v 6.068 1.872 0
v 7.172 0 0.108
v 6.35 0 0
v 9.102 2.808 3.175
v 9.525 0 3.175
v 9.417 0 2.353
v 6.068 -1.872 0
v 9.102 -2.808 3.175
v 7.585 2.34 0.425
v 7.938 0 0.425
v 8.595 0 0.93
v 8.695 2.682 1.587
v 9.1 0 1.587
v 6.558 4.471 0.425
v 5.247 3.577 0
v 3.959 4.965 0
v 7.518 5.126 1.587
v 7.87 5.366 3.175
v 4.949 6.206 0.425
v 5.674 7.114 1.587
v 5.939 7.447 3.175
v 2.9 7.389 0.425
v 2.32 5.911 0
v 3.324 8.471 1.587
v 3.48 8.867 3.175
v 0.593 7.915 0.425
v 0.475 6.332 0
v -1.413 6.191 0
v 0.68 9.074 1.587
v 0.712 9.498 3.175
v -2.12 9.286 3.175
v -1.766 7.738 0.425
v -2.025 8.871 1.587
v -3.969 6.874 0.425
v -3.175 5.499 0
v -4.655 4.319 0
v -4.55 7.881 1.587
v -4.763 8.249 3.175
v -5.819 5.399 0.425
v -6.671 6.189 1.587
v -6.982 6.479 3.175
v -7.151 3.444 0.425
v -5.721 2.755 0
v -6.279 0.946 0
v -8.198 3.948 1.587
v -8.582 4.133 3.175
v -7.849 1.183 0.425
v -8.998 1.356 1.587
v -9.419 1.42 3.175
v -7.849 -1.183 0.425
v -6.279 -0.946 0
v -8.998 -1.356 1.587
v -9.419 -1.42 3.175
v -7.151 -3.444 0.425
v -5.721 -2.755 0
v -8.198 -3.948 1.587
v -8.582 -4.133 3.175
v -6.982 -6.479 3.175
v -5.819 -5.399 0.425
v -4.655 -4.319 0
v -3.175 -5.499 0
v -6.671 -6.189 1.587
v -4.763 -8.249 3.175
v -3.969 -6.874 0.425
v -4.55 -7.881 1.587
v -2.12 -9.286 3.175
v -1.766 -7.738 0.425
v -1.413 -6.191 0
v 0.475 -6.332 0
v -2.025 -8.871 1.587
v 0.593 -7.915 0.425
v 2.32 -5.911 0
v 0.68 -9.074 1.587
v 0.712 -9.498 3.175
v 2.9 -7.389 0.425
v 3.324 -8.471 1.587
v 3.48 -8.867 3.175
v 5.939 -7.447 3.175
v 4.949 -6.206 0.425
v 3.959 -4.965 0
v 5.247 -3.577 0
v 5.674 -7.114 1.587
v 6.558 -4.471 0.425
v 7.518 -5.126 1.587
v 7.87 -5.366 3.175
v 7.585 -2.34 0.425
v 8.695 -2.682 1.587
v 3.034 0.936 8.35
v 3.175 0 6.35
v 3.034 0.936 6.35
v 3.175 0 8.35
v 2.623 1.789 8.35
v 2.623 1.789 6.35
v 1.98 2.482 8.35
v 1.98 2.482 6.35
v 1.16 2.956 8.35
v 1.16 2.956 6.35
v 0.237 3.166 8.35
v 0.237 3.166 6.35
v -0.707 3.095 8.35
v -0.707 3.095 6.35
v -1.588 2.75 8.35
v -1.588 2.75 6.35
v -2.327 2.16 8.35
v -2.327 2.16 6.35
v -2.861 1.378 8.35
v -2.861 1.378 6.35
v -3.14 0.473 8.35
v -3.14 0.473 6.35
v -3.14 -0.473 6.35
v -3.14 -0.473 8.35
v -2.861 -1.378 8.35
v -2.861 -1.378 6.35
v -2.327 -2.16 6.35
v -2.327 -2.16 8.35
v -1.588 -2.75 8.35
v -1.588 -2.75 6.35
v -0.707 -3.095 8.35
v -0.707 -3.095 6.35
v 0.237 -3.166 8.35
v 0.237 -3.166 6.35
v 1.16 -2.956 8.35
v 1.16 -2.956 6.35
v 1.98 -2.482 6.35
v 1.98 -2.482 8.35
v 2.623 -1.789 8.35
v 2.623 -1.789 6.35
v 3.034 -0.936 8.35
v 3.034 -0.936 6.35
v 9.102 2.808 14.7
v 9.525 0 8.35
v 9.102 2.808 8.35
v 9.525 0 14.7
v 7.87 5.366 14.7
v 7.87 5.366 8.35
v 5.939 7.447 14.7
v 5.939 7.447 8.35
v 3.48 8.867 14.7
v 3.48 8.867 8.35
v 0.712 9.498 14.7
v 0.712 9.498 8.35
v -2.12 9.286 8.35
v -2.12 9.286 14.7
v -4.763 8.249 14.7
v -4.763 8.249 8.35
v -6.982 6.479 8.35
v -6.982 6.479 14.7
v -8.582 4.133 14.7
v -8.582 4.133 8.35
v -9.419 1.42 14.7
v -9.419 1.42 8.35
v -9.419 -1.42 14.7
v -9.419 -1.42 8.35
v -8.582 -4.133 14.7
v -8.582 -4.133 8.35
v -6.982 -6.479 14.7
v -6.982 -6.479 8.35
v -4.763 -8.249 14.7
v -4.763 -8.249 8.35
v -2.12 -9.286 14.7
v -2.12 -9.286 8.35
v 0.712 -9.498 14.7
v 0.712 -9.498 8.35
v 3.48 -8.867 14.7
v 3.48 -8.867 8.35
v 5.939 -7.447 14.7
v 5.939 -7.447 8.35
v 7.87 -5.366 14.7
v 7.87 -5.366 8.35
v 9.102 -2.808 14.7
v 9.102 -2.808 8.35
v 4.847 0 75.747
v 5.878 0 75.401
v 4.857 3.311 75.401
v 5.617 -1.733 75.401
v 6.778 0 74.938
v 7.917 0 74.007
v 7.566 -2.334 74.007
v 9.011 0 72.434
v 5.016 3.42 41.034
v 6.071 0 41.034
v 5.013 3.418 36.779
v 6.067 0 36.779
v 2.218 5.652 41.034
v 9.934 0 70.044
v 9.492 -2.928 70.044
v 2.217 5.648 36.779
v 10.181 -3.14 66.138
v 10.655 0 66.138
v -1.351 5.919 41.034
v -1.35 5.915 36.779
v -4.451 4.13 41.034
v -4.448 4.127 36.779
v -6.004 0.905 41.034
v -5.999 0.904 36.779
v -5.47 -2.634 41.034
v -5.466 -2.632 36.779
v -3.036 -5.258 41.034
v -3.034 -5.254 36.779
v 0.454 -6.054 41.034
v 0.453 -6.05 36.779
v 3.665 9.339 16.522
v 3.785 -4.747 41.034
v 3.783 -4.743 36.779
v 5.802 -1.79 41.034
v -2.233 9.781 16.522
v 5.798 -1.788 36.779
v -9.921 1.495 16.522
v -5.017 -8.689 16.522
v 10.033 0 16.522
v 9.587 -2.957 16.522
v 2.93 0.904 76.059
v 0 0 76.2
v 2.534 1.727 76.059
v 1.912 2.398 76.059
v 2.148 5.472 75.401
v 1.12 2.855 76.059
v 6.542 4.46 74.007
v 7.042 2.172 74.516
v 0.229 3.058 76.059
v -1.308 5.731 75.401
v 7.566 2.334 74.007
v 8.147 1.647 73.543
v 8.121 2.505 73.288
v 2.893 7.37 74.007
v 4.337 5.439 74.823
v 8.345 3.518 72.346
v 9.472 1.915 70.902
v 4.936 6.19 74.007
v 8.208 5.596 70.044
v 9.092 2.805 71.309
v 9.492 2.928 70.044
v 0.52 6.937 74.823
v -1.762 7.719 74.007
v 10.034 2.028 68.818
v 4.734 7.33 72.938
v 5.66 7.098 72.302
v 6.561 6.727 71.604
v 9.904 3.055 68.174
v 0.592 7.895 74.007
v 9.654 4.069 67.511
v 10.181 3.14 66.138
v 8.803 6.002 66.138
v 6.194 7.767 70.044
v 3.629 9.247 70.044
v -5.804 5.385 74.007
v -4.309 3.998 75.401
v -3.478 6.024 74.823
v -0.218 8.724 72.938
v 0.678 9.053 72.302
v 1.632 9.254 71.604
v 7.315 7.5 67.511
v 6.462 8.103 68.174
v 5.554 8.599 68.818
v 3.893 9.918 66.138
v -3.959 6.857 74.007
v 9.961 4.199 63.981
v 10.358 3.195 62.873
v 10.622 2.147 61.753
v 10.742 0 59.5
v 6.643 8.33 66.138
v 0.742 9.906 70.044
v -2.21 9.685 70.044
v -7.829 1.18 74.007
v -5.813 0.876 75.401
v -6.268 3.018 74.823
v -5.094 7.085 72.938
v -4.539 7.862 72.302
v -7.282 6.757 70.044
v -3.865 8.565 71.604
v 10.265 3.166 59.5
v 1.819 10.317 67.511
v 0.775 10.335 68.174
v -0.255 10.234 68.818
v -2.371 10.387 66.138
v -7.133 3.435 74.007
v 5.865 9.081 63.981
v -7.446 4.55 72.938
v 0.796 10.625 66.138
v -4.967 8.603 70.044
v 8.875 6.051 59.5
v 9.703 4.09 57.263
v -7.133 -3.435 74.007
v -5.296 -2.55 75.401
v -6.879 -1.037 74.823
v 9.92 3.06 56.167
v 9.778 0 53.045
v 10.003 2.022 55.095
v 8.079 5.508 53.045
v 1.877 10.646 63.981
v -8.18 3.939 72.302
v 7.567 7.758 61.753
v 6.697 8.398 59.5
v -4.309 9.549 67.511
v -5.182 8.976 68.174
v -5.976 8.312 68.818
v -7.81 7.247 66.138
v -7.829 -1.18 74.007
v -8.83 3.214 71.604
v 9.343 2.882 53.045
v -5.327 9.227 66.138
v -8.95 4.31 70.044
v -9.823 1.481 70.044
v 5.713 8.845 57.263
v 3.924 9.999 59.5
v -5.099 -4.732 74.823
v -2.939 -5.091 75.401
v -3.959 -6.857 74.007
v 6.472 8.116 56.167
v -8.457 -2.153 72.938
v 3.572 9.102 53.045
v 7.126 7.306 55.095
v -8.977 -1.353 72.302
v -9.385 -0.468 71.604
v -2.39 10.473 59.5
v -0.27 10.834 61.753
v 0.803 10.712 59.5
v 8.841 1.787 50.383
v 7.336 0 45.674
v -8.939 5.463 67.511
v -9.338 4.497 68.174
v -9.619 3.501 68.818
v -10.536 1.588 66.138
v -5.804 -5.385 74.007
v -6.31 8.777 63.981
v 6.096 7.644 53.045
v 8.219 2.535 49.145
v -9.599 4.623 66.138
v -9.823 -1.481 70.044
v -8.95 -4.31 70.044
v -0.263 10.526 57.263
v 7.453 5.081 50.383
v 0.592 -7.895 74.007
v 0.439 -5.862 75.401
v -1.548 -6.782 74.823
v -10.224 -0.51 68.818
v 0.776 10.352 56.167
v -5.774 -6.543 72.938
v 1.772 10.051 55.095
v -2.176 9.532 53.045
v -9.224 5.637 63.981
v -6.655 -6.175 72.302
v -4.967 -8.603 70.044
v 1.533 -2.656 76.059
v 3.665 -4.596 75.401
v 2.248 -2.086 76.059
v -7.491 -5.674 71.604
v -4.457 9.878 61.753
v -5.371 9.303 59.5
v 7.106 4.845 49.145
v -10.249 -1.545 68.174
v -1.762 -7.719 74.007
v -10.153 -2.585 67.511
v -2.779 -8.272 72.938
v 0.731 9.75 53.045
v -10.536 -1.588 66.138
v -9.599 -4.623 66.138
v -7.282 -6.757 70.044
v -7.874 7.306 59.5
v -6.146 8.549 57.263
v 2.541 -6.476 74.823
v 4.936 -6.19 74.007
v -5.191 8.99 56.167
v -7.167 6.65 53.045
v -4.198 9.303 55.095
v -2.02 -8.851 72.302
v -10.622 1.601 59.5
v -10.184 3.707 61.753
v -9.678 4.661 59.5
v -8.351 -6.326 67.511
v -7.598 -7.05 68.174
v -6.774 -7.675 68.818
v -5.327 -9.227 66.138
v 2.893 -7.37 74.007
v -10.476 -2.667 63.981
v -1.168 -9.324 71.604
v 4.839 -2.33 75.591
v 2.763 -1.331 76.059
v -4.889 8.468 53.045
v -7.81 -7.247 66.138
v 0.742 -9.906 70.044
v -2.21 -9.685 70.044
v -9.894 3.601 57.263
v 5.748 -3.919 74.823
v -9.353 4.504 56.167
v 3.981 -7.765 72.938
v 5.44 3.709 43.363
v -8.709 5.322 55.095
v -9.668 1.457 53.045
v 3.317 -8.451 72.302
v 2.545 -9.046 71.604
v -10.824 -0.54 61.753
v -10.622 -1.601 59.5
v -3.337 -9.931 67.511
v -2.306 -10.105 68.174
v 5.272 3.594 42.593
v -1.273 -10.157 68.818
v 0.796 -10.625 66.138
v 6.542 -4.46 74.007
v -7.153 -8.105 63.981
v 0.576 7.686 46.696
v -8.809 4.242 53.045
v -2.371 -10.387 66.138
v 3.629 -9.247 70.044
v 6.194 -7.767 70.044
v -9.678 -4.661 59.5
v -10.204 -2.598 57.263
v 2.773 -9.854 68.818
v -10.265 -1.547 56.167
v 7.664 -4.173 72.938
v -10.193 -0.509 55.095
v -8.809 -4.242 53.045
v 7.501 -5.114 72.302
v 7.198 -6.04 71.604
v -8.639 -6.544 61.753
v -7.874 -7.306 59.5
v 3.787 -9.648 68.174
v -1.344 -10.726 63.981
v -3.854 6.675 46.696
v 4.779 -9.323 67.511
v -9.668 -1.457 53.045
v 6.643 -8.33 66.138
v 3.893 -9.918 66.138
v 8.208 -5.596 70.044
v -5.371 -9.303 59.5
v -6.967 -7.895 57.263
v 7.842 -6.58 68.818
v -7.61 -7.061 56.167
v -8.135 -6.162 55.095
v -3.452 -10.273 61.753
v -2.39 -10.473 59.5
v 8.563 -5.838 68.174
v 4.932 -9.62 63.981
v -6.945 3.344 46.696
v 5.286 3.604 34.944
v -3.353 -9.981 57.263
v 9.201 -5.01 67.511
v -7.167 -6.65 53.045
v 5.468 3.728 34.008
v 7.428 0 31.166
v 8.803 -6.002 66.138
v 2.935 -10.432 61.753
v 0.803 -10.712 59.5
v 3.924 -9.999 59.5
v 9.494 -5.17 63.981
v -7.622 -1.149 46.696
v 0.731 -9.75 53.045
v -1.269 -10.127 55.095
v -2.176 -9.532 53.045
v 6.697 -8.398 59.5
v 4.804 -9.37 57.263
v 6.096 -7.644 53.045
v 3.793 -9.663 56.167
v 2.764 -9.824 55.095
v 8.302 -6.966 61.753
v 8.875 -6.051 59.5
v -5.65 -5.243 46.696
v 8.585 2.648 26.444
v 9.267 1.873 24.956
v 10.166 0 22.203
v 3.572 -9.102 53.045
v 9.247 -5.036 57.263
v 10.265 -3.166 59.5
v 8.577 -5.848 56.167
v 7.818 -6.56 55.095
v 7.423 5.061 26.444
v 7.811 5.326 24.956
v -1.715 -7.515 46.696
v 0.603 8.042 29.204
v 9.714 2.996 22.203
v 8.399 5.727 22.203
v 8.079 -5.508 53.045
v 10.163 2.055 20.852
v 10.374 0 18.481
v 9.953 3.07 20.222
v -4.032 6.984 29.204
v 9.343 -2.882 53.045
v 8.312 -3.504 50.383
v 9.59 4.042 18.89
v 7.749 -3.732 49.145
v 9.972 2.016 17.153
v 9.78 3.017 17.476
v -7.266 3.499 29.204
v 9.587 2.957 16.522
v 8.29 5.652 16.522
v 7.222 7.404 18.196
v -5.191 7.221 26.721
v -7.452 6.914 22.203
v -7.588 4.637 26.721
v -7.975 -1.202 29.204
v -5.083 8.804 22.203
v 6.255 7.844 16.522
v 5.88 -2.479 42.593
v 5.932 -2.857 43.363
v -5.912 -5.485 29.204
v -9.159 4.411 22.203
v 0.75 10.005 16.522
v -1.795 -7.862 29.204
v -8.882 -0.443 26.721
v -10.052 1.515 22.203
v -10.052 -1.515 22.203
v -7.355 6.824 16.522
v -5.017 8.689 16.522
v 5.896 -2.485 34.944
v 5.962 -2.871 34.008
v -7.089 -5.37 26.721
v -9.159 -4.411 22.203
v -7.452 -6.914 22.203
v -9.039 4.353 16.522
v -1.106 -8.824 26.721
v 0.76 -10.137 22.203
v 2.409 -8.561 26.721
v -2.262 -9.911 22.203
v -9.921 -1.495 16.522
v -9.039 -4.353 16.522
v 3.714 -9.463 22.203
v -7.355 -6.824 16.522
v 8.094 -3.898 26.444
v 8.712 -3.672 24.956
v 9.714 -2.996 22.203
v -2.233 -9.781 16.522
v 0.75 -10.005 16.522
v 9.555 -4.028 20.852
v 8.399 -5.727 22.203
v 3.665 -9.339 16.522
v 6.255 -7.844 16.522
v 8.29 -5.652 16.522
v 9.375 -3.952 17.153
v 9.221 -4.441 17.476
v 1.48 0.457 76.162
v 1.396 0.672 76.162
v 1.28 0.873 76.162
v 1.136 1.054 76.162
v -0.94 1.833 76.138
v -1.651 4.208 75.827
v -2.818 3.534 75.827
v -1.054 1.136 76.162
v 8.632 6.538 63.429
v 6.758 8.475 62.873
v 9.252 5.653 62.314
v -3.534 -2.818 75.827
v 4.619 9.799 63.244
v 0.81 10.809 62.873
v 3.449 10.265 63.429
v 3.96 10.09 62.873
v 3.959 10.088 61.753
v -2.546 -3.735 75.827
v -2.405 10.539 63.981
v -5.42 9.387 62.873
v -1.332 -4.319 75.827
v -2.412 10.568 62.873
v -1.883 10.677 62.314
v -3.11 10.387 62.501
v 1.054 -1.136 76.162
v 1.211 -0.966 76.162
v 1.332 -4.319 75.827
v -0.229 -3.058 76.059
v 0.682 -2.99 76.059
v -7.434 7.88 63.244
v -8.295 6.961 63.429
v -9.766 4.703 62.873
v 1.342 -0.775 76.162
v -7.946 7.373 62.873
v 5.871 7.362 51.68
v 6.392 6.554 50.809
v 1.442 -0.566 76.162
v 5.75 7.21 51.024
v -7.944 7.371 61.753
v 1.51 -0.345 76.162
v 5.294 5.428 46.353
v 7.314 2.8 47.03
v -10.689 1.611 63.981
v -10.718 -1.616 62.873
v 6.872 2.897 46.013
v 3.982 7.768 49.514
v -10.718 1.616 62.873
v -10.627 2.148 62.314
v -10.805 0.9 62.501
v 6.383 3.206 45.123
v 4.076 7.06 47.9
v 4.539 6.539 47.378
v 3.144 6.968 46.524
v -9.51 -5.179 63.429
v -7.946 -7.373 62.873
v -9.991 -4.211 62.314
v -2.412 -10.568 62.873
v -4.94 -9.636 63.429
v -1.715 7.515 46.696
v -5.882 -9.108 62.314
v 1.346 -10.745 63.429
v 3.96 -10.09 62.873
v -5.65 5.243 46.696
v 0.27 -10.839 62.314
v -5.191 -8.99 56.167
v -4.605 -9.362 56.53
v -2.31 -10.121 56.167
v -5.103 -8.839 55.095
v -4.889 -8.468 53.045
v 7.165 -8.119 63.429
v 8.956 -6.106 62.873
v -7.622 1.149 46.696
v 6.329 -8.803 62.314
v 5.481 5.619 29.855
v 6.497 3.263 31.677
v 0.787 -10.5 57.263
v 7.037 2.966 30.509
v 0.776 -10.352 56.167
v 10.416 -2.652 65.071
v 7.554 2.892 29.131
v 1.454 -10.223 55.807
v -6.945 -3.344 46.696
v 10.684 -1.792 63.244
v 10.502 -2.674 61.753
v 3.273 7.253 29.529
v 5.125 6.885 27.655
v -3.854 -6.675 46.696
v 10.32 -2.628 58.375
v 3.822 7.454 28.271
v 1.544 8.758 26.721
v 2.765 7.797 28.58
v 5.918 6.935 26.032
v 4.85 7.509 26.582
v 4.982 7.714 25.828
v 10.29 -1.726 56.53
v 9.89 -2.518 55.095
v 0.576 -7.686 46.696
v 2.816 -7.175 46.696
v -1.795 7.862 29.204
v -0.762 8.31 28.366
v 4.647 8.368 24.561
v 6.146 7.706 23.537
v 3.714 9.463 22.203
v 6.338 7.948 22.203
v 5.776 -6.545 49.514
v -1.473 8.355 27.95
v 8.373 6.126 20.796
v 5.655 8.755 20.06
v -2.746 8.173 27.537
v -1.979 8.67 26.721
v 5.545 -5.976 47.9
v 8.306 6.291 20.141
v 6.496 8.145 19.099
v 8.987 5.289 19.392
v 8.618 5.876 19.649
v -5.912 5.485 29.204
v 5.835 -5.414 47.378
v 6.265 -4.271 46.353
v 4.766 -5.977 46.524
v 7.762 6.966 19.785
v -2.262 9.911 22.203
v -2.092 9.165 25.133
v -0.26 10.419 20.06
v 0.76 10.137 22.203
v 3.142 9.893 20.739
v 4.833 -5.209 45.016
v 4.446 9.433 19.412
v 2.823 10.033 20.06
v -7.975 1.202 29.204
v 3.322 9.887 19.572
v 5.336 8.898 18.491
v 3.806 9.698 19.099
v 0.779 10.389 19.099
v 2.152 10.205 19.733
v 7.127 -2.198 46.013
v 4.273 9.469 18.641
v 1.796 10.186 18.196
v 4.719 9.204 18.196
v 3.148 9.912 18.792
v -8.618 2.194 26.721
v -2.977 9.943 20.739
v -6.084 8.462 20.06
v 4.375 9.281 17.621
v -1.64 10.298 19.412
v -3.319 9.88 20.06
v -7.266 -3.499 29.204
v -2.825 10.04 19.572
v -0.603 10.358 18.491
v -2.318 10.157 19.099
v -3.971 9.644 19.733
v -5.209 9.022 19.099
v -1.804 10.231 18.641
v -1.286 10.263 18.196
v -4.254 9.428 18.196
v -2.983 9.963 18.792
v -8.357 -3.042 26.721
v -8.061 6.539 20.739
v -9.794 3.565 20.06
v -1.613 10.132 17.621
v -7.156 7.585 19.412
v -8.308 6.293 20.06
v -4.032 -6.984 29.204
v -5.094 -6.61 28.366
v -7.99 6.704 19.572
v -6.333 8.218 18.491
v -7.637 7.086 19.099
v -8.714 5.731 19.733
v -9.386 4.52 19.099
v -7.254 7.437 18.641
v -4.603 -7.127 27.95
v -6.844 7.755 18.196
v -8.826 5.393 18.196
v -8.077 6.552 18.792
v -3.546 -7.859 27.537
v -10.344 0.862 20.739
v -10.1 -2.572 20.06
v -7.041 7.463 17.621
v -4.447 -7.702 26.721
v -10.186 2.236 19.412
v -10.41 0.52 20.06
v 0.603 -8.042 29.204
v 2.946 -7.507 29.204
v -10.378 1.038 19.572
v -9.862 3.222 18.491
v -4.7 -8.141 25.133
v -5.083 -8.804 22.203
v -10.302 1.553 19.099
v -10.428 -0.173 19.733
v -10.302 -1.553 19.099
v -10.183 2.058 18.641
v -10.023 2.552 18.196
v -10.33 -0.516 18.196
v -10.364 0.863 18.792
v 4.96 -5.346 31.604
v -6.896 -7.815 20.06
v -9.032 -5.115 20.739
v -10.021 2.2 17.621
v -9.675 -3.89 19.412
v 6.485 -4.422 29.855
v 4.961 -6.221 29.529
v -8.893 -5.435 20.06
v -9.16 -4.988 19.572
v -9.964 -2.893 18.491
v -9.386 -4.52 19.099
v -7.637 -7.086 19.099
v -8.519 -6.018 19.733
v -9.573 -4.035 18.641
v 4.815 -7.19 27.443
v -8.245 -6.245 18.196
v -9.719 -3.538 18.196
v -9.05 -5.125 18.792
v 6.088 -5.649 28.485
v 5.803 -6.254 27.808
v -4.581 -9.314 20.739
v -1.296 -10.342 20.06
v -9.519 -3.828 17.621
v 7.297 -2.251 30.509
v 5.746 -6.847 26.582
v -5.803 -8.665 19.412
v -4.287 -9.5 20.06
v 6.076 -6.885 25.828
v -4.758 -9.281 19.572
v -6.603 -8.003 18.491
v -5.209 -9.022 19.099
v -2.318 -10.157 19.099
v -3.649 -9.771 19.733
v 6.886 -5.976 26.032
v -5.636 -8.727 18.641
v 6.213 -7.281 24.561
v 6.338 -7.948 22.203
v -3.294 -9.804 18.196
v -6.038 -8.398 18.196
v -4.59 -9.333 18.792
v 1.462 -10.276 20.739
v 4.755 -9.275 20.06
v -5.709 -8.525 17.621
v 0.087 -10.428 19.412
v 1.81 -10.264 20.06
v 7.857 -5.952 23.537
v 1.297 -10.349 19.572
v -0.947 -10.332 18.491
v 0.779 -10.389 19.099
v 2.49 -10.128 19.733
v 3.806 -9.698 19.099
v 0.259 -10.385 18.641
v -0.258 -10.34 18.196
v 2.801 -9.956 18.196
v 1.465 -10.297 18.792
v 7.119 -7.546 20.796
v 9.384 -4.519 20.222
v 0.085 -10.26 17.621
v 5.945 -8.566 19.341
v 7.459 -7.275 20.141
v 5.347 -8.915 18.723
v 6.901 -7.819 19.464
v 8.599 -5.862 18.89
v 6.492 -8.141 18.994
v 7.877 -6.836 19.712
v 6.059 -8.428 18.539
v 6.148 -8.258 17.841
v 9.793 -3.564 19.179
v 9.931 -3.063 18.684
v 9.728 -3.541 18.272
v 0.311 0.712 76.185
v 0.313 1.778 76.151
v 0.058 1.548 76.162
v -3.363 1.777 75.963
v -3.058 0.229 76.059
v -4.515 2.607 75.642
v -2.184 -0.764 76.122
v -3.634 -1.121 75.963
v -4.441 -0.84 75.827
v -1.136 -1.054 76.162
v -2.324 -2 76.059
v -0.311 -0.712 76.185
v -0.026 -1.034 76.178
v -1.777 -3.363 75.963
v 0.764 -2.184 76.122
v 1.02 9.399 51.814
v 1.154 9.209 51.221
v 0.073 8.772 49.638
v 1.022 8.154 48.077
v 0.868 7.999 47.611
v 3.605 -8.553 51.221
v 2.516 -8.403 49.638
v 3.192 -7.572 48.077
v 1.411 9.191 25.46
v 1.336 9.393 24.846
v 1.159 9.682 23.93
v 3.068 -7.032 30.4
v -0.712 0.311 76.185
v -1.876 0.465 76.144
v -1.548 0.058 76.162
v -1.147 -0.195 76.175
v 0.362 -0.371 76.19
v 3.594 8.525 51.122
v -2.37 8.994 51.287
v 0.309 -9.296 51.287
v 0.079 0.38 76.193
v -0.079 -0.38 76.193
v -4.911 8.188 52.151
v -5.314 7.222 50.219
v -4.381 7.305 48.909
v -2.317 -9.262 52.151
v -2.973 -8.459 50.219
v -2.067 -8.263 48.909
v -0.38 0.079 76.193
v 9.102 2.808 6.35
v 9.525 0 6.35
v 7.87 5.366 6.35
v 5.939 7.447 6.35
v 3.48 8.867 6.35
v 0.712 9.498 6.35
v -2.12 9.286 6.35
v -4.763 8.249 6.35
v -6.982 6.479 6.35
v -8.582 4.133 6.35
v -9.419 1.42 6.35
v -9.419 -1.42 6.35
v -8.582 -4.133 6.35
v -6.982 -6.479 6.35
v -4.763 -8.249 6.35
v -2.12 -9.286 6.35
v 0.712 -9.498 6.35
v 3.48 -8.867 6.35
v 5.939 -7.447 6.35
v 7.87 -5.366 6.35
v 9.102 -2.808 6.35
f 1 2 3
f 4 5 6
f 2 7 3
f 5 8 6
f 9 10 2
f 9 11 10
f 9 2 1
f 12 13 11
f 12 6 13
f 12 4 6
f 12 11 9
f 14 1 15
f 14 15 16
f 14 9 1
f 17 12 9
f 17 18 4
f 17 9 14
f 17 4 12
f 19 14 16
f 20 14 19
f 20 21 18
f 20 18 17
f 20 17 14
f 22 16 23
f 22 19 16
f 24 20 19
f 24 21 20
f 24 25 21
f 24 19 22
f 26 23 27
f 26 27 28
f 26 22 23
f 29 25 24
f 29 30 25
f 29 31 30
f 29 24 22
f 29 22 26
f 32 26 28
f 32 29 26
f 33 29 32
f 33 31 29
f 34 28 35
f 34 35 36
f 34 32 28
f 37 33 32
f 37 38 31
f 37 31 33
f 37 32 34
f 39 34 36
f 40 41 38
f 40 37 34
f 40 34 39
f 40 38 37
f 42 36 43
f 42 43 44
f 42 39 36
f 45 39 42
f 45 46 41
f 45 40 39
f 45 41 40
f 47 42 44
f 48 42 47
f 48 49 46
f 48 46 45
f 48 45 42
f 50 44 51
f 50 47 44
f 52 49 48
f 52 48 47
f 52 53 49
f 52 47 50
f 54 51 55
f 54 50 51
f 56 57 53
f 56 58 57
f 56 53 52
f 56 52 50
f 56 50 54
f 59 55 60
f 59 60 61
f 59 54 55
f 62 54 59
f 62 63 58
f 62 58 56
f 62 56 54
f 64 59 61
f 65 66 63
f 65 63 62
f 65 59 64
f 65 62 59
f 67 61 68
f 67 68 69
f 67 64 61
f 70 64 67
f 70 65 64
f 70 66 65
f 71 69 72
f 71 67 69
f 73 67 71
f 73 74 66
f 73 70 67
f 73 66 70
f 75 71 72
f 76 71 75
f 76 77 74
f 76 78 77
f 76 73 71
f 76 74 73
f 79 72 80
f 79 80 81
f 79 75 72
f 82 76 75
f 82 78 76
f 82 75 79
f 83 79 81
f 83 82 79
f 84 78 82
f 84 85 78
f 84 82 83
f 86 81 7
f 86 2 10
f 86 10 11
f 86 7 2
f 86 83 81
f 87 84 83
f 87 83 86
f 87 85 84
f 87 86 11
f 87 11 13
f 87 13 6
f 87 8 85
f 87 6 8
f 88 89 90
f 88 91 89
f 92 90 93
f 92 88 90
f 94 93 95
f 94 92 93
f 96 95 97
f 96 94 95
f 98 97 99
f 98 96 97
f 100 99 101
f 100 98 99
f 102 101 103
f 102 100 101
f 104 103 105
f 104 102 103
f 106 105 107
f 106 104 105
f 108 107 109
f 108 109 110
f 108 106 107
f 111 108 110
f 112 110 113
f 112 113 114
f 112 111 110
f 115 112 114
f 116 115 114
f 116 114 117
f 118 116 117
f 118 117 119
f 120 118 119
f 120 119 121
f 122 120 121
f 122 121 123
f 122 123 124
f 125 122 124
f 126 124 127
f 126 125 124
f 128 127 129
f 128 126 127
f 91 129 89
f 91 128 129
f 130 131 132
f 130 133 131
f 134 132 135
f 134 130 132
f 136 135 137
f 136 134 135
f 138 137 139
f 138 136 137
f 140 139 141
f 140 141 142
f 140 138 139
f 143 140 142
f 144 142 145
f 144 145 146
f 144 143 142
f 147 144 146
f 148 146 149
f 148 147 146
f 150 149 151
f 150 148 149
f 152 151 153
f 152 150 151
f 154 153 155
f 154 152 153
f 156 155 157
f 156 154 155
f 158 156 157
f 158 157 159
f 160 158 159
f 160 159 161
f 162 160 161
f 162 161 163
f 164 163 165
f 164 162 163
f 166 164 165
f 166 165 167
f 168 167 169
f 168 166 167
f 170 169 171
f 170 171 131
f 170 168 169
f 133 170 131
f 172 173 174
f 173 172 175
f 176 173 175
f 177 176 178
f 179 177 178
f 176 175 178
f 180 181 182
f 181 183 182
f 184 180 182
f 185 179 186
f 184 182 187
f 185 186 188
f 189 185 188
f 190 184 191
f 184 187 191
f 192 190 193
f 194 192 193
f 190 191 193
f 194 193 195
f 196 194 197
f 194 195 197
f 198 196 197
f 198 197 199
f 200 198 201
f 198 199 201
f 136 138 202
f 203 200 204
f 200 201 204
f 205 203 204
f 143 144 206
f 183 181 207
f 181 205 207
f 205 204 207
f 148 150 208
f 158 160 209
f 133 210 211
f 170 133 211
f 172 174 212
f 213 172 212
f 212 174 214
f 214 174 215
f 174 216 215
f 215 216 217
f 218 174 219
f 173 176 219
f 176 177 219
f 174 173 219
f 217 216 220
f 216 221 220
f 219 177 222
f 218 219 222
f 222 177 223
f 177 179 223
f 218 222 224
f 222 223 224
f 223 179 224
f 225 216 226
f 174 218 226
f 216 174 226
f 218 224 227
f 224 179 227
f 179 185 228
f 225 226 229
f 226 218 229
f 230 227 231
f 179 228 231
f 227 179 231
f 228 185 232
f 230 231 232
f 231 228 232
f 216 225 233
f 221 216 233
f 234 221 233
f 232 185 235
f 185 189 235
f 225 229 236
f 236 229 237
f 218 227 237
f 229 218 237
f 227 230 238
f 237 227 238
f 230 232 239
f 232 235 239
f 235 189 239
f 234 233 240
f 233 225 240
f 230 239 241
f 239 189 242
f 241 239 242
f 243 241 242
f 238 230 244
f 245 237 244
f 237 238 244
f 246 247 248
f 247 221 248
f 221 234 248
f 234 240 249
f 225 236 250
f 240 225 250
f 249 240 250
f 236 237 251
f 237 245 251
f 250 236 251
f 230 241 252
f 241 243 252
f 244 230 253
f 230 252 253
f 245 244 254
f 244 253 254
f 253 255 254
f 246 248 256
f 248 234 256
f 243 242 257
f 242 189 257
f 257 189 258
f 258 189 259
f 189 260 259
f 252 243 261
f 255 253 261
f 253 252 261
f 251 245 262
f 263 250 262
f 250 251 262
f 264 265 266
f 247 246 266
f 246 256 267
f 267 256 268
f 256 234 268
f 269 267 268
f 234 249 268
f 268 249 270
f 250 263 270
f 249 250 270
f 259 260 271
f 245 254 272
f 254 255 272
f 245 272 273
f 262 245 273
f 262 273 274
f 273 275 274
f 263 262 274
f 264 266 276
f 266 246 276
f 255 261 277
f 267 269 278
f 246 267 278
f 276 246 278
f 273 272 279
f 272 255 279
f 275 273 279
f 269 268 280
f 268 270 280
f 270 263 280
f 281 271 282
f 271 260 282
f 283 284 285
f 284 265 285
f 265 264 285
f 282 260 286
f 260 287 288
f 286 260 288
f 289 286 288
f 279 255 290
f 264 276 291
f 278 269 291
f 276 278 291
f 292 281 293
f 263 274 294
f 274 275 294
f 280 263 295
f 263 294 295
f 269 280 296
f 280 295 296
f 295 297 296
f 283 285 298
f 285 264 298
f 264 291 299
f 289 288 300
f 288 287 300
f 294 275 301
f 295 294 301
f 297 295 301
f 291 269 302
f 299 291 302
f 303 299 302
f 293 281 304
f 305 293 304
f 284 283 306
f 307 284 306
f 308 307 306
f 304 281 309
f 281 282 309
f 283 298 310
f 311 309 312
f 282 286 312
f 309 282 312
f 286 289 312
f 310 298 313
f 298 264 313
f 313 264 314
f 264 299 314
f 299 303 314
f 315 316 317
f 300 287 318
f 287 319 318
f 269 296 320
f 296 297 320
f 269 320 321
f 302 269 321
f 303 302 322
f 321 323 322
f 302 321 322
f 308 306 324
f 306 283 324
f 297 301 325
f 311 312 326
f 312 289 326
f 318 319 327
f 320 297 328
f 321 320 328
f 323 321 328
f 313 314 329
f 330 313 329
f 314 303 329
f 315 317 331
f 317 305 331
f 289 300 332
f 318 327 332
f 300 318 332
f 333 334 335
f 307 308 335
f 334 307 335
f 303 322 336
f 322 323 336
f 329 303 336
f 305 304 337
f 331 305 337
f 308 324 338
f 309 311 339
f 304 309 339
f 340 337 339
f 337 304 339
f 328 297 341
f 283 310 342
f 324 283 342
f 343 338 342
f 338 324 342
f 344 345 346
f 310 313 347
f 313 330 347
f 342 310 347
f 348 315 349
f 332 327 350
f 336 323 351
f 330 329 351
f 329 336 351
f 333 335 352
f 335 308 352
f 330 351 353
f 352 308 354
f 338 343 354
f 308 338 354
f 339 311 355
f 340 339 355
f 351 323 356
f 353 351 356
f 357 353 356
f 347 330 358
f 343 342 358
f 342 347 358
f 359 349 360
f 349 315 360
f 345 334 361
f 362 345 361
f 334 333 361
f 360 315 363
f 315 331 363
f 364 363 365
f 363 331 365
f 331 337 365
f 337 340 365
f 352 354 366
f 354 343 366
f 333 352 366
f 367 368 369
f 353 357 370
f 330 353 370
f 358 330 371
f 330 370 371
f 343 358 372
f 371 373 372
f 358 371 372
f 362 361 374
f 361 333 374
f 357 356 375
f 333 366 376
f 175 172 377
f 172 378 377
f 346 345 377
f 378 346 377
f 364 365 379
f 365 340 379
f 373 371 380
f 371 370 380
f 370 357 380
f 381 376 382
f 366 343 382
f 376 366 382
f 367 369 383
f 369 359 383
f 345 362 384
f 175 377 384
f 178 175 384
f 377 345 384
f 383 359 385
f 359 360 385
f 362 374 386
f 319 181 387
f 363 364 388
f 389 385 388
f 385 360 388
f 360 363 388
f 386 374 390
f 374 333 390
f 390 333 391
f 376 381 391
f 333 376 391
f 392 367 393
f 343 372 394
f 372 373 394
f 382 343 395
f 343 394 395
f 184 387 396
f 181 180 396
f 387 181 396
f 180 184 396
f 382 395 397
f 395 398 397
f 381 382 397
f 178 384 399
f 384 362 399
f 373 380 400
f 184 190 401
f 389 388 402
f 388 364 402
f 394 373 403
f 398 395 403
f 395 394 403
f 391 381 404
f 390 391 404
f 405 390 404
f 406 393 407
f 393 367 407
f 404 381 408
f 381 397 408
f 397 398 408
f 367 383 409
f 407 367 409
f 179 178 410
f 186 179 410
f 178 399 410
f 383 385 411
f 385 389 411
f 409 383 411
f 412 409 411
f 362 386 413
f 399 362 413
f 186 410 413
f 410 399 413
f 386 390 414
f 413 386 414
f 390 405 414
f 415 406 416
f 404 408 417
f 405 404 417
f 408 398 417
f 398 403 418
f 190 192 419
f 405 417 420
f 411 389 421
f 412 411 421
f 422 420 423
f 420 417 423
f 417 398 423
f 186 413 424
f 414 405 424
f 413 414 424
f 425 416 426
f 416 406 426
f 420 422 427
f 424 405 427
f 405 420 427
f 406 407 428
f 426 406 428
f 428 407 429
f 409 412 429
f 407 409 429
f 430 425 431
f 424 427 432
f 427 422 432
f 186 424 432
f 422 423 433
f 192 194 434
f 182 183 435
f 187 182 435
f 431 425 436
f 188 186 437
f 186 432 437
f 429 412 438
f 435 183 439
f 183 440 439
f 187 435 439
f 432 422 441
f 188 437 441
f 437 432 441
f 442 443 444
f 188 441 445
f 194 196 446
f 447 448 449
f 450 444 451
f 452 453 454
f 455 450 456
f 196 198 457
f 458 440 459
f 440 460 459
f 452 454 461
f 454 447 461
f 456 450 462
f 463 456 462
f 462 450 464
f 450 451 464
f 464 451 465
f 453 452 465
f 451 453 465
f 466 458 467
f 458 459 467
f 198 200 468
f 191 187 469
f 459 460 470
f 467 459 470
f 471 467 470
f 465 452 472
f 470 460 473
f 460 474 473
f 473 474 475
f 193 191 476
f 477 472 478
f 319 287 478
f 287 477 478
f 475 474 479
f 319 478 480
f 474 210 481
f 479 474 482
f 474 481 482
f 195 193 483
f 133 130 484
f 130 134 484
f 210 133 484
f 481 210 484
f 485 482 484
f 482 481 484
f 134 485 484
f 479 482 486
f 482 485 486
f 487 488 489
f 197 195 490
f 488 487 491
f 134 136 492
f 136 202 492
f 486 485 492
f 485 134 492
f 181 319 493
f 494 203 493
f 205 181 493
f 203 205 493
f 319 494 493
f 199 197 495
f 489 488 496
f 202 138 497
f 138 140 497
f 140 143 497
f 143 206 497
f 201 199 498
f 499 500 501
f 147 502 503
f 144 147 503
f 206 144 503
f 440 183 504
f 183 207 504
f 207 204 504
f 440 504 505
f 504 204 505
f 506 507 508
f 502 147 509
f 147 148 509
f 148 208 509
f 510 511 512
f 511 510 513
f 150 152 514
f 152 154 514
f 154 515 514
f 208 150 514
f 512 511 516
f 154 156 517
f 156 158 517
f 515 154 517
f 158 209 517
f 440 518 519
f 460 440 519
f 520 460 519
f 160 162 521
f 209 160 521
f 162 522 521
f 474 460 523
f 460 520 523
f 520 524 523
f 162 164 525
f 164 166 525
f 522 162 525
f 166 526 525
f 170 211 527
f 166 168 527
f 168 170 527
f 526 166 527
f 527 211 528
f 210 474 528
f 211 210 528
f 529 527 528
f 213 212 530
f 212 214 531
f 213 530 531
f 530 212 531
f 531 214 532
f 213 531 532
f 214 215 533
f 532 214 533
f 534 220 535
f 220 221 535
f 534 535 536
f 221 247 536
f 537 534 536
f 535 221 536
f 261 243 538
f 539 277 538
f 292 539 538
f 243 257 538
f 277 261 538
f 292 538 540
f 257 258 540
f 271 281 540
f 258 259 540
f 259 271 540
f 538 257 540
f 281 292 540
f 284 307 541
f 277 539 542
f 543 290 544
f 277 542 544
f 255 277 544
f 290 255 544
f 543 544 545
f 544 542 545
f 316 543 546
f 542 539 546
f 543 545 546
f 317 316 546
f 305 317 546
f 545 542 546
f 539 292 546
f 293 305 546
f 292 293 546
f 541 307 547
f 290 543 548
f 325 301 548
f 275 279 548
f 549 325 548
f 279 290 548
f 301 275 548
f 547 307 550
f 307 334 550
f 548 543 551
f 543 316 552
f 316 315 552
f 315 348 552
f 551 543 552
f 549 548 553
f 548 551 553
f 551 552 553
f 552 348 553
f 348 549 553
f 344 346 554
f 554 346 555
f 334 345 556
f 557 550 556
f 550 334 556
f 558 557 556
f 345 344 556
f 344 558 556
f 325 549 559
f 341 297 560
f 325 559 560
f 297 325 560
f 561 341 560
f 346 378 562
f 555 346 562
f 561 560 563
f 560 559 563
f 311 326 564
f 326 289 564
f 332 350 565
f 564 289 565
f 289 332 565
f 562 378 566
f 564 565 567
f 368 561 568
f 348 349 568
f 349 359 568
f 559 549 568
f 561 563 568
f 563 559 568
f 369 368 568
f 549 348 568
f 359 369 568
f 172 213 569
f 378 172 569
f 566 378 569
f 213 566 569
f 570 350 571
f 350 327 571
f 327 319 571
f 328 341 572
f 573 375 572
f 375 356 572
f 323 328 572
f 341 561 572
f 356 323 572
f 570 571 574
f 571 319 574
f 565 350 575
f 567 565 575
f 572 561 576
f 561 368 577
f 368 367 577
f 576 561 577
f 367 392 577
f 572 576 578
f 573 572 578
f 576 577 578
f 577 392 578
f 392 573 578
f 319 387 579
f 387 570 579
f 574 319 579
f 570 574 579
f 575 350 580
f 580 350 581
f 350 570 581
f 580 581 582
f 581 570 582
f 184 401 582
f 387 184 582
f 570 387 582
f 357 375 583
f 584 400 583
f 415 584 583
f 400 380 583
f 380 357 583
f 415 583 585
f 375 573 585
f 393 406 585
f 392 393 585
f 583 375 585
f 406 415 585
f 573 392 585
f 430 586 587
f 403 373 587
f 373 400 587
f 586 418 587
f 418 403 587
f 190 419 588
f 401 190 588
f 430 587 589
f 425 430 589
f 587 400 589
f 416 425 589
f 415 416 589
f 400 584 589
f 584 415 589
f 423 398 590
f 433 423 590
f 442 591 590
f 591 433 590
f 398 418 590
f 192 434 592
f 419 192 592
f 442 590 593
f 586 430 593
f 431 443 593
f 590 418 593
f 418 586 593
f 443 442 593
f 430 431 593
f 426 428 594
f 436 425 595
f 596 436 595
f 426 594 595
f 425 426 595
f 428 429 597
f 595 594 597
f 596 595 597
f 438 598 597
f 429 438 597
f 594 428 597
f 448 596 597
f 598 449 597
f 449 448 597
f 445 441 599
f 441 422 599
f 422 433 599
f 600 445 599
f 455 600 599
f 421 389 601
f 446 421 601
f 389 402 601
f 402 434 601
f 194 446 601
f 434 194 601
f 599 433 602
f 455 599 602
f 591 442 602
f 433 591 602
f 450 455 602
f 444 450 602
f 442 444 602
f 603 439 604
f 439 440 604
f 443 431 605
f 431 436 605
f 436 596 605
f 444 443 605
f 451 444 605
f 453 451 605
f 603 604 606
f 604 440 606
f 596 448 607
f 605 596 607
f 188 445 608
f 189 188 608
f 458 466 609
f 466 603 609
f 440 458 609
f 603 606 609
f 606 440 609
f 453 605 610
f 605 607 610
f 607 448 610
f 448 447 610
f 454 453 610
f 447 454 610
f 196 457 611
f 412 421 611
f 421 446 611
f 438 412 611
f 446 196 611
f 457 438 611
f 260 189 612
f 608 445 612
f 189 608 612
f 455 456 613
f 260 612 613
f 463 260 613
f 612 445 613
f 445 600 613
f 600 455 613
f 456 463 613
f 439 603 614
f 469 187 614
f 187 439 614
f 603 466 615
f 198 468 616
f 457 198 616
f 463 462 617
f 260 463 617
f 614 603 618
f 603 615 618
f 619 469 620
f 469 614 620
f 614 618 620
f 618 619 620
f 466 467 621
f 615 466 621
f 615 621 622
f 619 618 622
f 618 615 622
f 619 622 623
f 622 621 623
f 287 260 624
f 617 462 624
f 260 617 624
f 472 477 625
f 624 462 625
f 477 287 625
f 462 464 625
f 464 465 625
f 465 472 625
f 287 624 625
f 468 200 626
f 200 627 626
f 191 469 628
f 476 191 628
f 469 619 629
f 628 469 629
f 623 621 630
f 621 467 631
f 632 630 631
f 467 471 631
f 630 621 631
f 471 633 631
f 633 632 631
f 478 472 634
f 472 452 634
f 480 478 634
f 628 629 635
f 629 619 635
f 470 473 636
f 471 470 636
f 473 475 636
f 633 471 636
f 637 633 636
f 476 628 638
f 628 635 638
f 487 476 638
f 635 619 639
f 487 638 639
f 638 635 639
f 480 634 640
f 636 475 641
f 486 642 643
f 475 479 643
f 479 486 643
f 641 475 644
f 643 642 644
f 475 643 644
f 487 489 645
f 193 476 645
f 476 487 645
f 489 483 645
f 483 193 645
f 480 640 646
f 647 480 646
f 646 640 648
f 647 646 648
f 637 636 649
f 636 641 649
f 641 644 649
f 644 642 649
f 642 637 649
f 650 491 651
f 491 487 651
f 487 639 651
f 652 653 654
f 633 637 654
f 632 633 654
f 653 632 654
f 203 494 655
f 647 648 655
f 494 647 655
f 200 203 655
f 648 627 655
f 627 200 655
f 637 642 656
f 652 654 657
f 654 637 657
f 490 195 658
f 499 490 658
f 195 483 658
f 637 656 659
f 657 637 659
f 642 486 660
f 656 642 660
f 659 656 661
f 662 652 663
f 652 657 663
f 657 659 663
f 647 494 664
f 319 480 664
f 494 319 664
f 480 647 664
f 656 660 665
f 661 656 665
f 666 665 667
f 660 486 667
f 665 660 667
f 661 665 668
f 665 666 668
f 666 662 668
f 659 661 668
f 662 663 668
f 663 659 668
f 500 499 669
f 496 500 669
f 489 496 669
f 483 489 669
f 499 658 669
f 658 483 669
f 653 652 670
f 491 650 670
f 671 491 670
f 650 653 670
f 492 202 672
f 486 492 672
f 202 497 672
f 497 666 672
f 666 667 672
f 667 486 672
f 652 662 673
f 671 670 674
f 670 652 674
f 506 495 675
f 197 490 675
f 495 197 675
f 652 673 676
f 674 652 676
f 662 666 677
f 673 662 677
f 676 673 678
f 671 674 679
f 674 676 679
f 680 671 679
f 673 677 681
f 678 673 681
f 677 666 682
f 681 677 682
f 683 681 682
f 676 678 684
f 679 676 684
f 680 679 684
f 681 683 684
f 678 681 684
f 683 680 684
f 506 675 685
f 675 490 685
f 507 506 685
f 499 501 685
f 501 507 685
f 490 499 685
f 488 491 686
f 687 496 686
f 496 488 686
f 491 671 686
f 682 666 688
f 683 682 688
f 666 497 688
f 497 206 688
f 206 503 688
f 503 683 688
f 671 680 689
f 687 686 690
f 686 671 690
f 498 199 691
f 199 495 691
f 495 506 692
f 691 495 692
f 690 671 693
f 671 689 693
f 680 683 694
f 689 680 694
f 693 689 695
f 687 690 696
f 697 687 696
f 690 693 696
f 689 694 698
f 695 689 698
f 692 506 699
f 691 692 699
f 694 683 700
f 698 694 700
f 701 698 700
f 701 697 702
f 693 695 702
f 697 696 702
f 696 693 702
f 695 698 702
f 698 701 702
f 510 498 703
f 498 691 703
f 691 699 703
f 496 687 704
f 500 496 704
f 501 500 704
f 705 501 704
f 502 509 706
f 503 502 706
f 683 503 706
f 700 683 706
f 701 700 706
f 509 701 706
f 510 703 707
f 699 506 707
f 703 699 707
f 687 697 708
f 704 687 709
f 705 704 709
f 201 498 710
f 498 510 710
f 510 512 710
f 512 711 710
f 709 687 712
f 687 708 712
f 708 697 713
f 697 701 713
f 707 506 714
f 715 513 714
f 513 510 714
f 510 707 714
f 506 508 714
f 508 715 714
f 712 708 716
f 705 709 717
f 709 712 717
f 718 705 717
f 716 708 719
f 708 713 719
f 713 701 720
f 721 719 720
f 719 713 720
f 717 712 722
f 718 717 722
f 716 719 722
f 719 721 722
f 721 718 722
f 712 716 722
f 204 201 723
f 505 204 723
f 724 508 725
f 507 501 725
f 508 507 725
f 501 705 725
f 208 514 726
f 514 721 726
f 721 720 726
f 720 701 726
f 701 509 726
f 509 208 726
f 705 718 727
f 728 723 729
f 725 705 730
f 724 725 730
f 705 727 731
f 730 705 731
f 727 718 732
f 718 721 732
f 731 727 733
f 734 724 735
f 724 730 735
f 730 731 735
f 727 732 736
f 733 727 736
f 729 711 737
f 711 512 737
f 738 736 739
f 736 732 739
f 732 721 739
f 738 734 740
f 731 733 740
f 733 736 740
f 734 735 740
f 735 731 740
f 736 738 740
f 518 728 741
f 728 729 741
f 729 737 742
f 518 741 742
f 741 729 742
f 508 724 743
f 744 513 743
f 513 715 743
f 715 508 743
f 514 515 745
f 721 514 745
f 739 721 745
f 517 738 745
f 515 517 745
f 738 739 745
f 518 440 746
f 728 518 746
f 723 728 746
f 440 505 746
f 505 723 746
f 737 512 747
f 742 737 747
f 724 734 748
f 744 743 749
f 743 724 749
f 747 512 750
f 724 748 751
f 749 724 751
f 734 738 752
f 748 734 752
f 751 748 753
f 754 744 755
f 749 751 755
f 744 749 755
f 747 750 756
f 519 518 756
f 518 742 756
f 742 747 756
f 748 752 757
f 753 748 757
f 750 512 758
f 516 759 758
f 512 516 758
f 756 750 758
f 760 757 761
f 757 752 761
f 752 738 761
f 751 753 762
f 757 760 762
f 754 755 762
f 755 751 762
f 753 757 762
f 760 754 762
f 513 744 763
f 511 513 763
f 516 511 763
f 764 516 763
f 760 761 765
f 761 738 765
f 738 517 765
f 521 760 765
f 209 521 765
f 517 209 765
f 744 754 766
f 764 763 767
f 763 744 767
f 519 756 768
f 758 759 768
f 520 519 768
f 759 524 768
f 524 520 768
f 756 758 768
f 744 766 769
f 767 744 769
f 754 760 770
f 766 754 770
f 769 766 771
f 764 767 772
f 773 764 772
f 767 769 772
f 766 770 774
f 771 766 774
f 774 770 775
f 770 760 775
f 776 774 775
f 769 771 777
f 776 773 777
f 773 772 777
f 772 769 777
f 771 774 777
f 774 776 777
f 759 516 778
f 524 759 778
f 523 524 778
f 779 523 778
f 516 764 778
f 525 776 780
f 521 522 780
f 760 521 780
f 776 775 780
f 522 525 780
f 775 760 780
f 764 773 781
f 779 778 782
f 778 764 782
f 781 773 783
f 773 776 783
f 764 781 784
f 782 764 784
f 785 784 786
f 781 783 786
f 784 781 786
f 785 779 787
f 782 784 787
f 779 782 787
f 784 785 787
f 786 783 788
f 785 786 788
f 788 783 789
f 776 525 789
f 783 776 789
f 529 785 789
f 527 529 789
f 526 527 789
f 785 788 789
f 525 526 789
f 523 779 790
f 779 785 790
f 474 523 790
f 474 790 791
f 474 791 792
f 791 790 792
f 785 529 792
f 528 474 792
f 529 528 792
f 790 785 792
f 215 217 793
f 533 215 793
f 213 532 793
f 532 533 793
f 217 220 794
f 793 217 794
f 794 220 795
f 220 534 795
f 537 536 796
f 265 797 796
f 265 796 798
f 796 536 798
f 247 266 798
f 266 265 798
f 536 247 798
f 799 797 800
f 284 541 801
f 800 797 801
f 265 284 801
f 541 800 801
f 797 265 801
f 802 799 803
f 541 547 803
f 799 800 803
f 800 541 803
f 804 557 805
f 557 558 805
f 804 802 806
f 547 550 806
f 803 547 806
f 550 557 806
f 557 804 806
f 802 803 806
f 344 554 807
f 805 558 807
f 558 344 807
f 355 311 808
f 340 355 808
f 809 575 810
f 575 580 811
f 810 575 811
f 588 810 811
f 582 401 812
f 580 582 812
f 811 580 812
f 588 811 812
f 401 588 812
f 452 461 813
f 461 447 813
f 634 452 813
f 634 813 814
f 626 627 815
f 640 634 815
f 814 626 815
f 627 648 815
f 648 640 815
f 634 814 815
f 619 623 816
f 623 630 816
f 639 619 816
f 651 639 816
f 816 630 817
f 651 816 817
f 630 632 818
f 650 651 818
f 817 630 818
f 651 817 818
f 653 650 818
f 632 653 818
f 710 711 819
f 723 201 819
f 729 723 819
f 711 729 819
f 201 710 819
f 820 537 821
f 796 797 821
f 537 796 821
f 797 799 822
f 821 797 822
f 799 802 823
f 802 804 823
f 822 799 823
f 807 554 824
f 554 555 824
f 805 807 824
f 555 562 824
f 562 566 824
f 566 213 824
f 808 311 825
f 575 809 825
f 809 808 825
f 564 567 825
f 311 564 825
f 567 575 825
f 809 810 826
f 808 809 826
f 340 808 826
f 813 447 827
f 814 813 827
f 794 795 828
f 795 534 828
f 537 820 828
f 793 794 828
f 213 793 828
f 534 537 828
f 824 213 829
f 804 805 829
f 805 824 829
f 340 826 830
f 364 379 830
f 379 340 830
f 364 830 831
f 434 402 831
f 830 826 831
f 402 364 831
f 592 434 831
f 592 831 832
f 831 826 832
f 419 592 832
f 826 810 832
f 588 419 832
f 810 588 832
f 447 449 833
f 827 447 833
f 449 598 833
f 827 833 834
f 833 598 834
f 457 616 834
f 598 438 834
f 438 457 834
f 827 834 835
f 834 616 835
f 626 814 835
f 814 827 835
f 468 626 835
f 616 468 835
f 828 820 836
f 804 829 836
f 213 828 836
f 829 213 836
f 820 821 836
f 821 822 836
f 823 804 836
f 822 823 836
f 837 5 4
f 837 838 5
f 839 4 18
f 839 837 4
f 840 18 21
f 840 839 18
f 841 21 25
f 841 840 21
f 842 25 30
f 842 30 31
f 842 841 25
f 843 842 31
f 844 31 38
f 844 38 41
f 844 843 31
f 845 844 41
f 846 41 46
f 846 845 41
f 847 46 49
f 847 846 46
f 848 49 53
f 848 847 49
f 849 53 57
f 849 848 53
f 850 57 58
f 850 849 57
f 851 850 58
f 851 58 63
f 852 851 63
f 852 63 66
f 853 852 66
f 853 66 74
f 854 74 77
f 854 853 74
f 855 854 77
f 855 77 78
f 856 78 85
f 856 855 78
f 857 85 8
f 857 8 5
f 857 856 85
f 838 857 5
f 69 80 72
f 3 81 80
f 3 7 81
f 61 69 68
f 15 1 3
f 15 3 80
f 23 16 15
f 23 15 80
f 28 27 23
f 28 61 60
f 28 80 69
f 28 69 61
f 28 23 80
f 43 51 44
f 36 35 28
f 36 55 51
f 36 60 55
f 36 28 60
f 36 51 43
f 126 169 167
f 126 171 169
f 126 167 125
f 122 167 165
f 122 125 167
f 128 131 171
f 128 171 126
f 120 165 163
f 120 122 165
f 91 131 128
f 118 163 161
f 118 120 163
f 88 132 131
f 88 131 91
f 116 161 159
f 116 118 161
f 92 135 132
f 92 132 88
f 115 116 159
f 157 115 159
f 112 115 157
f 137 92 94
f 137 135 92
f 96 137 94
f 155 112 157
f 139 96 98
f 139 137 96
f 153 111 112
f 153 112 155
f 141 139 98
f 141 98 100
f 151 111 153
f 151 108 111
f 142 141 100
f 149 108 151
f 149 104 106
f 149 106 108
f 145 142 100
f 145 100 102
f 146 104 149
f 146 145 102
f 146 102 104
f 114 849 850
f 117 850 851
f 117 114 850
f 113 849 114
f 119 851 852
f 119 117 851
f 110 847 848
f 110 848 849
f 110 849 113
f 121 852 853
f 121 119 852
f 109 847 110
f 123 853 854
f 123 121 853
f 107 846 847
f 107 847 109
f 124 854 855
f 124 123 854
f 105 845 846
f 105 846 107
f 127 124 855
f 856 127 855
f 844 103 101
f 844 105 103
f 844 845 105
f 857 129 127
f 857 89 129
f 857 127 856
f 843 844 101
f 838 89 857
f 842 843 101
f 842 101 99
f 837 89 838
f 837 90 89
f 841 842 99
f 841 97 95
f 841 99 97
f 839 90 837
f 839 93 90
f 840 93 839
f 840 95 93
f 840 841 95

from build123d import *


with BuildPart() as f1:
    # F0 (on Front) → F1 (revolve)
    with BuildSketch(Plane.XZ):
        with BuildLine():
            Line((0, 76.2), (0, 0))
            Line((0, 0), (6.35, 0))
            ThreePointArc((6.35, 0), (8.5950640303, 0.9299359697), (9.525, 3.175))
            Line((9.525, 3.175), (9.525, 6.35))
            Line((9.525, 6.35), (3.175, 6.35))
            Line((3.175, 6.35), (3.175, 8.35))
            Line((3.175, 8.35), (9.525, 8.35))
            Line((9.525, 8.35), (9.525, 14.7))
            add(Edge.make_bspline(
                [(0, 76.2), (3.168798384, 76.1437072296), (11.1827318992, 76.0013439789), (11.5605251086, 51.7730056699), (2.8817099393, 39.4723955532), (11.6856190133, 21.9527870322), (10.1300446041, 16.7310482843), (9.525, 14.7)],
                knots=[0, 0, 0, 0, 0.1621620078, 0.4101099439, 0.6253550155, 0.854278438, 1, 1, 1, 1], degree=3))
        make_face()
    revolve(axis=Axis((0, 0, 38.1), (0, 0, 1)))


solid = f1.part
